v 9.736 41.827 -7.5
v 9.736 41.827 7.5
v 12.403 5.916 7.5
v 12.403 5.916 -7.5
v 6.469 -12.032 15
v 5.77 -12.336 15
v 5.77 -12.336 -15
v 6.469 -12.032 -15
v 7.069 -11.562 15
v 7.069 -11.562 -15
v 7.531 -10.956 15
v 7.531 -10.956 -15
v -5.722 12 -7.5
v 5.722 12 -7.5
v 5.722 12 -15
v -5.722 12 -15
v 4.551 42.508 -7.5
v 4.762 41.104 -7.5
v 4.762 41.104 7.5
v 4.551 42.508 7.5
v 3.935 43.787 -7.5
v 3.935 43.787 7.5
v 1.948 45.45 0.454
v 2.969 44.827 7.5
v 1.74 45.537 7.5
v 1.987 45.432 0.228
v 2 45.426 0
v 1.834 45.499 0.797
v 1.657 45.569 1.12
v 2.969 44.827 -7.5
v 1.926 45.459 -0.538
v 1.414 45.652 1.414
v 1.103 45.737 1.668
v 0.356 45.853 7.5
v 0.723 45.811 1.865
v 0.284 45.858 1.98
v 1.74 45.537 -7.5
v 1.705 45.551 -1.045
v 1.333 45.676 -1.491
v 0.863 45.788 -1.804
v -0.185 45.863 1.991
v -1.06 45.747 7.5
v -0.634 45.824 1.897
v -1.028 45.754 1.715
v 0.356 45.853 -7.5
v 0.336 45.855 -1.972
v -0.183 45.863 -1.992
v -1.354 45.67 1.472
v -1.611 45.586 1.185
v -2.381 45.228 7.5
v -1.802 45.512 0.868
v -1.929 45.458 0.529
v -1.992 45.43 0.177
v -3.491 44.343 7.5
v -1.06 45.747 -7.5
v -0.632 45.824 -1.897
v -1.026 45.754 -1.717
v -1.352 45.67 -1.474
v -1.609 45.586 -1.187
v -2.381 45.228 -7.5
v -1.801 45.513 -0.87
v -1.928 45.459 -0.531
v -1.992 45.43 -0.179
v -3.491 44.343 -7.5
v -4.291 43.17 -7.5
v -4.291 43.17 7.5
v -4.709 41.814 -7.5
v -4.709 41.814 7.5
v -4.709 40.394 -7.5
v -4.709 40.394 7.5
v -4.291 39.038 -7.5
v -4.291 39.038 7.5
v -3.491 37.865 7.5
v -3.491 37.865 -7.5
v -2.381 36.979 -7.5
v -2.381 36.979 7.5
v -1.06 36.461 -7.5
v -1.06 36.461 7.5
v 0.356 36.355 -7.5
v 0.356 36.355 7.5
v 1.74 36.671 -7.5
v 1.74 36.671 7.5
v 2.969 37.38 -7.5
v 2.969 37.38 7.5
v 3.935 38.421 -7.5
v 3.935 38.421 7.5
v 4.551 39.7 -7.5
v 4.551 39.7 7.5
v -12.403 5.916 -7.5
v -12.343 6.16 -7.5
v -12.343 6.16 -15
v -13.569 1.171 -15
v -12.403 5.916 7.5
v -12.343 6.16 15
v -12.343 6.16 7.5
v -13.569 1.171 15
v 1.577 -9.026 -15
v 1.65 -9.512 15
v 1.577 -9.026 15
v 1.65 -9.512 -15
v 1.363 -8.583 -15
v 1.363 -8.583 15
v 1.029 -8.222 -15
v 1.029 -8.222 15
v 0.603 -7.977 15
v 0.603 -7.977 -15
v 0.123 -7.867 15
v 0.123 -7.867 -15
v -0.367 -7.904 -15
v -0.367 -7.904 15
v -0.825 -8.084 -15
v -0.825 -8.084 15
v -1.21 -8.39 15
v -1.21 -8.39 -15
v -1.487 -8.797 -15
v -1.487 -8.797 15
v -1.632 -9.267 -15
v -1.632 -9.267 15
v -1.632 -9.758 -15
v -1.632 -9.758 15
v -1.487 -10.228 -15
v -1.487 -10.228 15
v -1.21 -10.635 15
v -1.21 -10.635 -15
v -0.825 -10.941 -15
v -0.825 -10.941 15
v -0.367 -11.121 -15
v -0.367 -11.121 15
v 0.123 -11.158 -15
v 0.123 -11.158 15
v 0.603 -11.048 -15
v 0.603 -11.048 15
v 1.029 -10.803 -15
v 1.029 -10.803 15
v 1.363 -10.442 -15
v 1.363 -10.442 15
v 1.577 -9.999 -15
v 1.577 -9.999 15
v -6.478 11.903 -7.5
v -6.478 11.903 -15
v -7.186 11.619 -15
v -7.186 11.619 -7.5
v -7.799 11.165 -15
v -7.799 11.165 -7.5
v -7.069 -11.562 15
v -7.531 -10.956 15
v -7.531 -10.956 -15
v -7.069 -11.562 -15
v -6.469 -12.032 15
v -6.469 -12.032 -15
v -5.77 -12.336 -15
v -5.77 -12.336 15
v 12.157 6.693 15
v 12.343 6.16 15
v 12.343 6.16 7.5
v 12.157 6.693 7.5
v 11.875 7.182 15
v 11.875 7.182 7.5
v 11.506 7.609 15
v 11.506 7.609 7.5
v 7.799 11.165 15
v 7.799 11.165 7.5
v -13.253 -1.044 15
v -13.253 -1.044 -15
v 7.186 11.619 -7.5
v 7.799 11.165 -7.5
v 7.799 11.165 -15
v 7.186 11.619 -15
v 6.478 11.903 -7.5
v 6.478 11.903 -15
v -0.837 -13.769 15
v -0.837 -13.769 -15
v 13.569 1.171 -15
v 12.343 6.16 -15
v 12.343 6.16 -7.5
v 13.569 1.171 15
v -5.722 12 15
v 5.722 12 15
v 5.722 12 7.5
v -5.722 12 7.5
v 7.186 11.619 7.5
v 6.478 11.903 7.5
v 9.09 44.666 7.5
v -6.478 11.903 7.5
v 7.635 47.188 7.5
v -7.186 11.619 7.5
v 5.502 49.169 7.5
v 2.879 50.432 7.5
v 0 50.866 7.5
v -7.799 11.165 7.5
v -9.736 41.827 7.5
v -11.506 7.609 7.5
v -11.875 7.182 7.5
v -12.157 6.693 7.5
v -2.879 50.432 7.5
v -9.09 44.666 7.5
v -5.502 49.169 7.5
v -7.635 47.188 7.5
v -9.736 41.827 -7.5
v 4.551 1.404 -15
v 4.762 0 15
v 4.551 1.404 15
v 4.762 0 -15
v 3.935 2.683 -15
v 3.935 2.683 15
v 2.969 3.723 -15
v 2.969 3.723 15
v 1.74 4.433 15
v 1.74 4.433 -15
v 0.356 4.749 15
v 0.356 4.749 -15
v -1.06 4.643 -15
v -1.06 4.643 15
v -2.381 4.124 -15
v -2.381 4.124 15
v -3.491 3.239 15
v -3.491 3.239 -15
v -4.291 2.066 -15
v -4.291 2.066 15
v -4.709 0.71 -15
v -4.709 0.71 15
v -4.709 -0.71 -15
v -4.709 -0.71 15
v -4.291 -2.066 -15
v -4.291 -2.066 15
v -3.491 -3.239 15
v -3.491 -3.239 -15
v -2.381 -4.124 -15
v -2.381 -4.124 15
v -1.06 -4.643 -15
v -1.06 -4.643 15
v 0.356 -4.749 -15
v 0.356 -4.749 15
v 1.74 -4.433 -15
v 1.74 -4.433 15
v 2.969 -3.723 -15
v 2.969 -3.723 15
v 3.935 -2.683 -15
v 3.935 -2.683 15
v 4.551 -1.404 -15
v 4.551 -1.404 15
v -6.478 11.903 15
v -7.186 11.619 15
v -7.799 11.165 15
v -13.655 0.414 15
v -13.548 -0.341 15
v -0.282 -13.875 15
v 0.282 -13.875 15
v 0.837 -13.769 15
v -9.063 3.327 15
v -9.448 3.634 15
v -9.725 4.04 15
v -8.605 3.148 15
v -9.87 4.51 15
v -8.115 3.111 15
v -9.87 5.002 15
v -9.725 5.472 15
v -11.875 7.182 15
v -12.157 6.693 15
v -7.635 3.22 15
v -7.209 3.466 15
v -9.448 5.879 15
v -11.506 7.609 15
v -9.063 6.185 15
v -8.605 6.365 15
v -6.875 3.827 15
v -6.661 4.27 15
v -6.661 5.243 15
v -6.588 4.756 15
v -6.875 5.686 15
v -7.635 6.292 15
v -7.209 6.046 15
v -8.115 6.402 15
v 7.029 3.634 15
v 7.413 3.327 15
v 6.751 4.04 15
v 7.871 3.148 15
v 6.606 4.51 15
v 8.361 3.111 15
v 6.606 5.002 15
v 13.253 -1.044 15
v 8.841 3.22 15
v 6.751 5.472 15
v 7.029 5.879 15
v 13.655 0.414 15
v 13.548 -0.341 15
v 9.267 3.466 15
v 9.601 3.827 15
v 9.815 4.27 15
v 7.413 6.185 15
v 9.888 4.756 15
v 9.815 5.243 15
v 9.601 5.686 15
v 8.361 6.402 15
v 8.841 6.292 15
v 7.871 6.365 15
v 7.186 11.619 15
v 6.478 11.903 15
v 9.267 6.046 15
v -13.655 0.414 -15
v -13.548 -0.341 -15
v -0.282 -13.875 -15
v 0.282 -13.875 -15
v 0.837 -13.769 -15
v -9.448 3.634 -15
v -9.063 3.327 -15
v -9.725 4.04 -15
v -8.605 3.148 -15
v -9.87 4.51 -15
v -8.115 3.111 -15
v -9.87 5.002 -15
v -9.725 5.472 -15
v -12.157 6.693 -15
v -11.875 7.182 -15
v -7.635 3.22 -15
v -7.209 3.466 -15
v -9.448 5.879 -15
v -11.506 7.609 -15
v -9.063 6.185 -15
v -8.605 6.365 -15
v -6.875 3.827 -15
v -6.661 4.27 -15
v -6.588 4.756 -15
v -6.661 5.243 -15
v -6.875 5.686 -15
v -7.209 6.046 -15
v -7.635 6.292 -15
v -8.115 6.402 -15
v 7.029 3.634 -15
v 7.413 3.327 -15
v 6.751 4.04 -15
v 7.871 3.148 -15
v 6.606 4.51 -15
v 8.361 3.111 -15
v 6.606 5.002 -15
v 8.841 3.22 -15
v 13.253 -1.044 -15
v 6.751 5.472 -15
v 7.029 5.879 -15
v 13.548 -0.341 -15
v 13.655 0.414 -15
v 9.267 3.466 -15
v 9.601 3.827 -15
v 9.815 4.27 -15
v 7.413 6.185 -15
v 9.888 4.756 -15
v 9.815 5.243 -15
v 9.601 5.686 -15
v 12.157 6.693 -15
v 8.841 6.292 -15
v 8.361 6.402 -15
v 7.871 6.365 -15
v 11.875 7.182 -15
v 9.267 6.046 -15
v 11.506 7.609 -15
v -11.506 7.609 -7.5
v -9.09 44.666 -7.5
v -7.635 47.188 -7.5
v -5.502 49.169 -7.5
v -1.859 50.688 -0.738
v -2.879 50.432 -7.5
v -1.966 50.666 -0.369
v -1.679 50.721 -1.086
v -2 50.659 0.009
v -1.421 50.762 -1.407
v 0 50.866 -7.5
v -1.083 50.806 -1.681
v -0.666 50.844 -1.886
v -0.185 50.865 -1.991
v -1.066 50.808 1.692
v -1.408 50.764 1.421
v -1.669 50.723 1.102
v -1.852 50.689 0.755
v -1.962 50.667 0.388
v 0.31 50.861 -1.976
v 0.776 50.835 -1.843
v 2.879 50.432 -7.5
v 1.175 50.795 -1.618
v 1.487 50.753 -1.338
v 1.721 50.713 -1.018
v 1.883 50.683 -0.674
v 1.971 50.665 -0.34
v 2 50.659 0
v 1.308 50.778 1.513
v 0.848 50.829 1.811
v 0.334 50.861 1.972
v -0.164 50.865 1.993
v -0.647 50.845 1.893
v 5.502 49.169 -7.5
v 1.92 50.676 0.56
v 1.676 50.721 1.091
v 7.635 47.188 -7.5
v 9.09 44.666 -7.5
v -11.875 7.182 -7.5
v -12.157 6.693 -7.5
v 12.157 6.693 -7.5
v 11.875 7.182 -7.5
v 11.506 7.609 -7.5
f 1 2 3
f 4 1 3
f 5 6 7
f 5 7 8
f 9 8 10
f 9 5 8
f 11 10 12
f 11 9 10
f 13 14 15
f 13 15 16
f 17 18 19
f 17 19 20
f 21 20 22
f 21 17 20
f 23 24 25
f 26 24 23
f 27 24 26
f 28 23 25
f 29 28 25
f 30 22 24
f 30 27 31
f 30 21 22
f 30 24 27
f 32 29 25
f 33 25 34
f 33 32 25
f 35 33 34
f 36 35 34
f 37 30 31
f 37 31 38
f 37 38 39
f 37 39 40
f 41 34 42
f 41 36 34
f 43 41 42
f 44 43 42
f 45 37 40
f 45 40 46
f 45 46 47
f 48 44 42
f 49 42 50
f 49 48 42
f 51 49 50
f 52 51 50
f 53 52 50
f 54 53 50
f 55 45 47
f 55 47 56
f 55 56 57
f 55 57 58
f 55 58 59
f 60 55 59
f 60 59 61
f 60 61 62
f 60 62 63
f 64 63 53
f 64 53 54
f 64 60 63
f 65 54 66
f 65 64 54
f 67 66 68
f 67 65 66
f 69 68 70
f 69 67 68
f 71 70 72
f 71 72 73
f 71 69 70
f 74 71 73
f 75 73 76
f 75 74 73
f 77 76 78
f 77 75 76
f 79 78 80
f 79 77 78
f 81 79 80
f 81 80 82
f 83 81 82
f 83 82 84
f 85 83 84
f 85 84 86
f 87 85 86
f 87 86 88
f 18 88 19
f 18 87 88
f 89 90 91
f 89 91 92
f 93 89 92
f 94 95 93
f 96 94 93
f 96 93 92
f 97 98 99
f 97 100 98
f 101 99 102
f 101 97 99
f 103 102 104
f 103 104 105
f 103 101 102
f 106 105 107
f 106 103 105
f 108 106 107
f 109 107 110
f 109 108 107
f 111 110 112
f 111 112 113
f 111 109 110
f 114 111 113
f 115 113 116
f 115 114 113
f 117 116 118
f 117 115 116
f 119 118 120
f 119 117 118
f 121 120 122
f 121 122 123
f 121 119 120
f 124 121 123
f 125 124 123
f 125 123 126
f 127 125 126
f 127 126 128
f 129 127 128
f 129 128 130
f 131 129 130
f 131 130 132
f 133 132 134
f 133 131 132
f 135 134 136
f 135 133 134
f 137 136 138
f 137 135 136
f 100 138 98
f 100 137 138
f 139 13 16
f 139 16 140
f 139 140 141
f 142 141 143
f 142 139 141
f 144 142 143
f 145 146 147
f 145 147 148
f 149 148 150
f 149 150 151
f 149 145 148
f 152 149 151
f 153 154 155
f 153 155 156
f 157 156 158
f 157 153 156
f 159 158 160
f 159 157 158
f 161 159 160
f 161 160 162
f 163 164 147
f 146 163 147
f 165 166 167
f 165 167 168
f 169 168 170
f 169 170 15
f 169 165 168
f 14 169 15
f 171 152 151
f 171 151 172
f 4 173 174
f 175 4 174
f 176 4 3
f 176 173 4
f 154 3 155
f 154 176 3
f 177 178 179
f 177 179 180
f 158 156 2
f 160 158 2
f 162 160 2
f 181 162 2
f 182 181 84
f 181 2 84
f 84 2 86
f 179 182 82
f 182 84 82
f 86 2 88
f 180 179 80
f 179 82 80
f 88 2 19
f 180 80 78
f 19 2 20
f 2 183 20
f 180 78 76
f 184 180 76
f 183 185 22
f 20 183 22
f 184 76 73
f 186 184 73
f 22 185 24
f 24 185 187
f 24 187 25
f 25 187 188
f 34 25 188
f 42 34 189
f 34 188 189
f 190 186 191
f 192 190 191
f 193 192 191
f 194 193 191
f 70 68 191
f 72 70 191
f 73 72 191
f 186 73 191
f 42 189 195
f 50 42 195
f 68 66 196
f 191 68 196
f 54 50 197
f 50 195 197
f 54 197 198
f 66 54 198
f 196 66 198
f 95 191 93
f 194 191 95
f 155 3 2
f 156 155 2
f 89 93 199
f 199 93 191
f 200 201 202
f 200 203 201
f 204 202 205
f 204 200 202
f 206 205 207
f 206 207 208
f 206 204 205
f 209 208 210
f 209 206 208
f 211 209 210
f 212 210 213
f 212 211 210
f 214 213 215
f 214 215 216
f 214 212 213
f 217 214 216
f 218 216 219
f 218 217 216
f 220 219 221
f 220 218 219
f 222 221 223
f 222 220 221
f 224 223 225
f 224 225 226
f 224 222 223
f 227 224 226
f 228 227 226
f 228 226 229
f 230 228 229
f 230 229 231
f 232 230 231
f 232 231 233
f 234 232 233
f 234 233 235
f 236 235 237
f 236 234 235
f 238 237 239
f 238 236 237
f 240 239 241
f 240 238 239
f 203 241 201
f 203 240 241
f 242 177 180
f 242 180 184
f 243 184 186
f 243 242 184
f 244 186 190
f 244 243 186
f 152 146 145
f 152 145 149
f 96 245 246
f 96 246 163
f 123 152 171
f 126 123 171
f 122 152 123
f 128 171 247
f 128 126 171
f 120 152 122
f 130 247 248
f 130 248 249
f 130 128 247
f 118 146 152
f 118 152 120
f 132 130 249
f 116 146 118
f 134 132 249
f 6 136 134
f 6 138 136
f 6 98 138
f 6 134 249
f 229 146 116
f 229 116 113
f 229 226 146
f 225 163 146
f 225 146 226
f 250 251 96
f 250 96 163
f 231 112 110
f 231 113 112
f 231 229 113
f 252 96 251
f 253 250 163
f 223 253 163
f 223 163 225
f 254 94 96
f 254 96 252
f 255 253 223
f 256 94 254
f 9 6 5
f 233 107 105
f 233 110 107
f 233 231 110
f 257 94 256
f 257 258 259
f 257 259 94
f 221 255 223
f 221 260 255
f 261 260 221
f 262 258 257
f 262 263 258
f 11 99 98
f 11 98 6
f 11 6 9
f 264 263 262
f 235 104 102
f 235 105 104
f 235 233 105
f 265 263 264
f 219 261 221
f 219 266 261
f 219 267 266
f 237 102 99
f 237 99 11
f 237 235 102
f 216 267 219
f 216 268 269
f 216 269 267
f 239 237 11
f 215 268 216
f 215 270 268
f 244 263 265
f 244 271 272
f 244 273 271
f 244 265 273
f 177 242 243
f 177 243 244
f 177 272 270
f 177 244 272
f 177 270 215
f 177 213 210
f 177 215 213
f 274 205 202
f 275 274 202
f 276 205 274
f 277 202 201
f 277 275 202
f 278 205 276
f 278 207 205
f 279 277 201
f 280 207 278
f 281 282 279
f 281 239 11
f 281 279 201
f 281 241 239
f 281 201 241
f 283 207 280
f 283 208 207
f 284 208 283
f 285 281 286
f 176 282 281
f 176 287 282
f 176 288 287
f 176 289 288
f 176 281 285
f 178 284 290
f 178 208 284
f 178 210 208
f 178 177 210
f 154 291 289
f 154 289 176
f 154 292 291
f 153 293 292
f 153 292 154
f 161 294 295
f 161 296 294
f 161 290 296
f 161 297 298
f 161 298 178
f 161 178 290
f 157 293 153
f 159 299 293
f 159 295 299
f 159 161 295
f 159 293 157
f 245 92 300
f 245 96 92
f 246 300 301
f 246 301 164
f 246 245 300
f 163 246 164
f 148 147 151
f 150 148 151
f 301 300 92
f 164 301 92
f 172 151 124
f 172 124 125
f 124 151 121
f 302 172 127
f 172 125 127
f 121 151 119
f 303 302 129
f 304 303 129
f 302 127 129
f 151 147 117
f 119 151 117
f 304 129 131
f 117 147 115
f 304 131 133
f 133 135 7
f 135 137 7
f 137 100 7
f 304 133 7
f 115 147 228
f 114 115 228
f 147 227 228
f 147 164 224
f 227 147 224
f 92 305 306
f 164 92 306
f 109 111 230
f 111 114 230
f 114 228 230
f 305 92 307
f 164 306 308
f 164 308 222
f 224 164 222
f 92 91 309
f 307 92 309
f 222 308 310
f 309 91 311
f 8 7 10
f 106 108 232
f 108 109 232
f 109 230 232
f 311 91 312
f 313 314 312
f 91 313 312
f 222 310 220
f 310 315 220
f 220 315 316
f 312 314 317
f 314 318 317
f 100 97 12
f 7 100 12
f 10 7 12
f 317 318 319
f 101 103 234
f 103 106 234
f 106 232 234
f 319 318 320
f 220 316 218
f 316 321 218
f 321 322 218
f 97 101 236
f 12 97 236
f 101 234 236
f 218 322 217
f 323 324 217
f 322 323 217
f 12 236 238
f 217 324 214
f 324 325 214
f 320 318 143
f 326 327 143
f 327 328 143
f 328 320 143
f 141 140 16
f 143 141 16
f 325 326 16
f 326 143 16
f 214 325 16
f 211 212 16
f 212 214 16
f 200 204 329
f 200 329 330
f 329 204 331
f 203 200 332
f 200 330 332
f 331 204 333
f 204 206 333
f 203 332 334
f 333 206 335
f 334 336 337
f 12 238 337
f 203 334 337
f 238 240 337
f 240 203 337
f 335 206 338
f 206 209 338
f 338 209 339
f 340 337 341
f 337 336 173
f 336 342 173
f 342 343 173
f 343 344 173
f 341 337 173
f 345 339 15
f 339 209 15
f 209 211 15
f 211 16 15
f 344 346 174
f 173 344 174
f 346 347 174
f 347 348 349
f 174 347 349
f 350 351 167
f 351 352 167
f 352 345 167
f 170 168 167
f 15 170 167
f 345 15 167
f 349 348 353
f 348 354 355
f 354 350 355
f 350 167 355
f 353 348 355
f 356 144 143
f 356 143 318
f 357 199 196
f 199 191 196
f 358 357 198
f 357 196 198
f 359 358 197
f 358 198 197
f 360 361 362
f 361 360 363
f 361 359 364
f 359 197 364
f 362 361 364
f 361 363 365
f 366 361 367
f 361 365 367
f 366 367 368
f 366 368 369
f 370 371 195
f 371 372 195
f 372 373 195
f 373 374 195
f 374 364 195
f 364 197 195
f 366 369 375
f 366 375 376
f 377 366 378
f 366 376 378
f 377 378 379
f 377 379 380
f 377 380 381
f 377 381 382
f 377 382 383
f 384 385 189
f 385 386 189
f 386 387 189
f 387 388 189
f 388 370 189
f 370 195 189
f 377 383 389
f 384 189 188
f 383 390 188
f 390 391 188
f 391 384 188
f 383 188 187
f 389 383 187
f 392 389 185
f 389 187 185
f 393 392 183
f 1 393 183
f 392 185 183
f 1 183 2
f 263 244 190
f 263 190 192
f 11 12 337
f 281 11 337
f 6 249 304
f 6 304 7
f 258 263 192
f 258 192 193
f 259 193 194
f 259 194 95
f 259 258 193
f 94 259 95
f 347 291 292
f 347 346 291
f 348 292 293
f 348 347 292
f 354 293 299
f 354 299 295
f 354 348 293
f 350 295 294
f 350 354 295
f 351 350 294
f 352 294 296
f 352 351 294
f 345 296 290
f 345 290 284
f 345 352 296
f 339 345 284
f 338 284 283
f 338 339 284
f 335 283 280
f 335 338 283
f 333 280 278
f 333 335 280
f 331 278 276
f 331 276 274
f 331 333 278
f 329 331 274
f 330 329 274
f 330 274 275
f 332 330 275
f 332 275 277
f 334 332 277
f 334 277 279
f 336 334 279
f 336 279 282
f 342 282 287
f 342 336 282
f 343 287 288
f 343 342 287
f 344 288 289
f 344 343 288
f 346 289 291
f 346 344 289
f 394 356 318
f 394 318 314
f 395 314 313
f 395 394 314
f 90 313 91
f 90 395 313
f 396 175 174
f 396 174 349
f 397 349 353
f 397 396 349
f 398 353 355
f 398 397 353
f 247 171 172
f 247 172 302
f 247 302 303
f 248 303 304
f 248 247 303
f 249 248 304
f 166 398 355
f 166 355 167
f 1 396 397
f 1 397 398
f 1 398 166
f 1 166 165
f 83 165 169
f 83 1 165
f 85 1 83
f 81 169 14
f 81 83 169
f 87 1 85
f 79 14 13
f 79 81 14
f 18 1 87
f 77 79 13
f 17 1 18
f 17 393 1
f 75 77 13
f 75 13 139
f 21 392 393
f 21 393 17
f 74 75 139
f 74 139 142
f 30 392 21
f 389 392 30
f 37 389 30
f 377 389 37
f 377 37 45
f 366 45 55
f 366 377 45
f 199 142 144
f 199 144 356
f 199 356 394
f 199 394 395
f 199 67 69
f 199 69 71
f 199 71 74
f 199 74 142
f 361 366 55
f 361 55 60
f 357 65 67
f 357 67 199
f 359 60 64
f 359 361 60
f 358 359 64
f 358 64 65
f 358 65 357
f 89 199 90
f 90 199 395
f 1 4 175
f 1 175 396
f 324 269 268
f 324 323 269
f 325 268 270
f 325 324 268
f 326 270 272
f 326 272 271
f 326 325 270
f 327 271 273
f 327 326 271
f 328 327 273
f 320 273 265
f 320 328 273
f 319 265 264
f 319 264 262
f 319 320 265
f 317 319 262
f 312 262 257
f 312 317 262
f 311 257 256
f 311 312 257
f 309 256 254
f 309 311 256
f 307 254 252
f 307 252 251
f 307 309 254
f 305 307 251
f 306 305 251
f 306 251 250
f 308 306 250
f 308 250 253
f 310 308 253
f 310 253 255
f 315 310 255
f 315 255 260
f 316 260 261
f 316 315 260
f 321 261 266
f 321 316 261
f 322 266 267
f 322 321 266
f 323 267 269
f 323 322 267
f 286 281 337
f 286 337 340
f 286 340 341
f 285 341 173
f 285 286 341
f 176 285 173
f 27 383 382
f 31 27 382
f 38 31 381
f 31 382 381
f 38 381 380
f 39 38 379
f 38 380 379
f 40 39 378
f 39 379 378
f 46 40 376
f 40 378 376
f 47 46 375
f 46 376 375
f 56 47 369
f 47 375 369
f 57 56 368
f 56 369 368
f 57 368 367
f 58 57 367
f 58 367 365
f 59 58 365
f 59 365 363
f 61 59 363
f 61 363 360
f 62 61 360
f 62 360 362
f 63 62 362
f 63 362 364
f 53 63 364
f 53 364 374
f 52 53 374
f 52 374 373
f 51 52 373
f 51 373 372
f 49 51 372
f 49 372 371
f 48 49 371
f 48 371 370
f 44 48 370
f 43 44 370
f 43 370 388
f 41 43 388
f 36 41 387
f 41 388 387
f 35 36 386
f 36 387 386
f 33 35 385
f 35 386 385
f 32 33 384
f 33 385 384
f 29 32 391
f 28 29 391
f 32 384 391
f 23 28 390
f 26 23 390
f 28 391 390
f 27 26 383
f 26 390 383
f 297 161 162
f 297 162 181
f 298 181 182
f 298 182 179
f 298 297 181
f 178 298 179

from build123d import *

# Parameters (mm, degrees)
SKETCH1_R           = 4.7625
SKETCH1_R_2         = 1.65
BOSS_EXTRUDE1_DEPTH = 15
SKETCH2_R           = 4.7625
BOSS_EXTRUDE2_DEPTH = 7.5
CUT_EXTRUDE1_REACH  = 66.755
SKETCH3_R           = 2


with BuildPart() as part:
    # Sketch1 → Boss-Extrude1 (new body, symmetric)
    with BuildSketch(Plane.XY):
        with BuildLine():
            Line((-13.253372163, -1.044486042), (-7.531237528, -10.955513958))
            ThreePointArc((-7.531237528, -10.955513958), (-6.784217233, -11.816359568), (-5.770008435, -12.336431676))
            Line((-5.770008435, -12.336431676), (-0.836847118, -13.76941319))
            ThreePointArc((-0.836847118, -13.76941319), (0, -13.888495471), (0.836847118, -13.76941319))
            Line((0.836847118, -13.76941319), (5.770008435, -12.336431676))
            ThreePointArc((5.770008435, -12.336431676), (6.784217233, -11.816359568), (7.531237528, -10.955513958))
            Line((7.531237528, -10.955513958), (13.253372163, -1.044486042))
            ThreePointArc((13.253372163, -1.044486042), (13.625376182, 0.032875315), (13.568667441, 1.171241953))
            Line((13.568667441, 1.171241953), (12.343085176, 6.159975731))
            ThreePointArc((12.343085176, 6.159975731), (12.027789898, 6.944247736), (11.506238058, 7.609437458))
            Line((11.506238058, 7.609437458), (7.798659006, 11.165189723))
            ThreePointArc((7.798659006, 11.165189723), (6.841158949, 11.783484253), (5.722134635, 12))
            Line((5.722134635, 12), (-5.722134635, 12))
            ThreePointArc((-5.722134635, 12), (-6.841158949, 11.783484253), (-7.798659006, 11.165189723))
            Line((-7.798659006, 11.165189723), (-11.506238058, 7.609437458))
            ThreePointArc((-11.506238058, 7.609437458), (-12.027789898, 6.944247736), (-12.343085176, 6.159975731))
            Line((-12.343085176, 6.159975731), (-13.568667441, 1.171241953))
            ThreePointArc((-13.568667441, 1.171241953), (-13.625376182, 0.032875315), (-13.253372163, -1.044486042))
        make_face()
        Circle(SKETCH1_R, mode=Mode.SUBTRACT)
        with Locations((-8.238066653, 4.75625)):
            Circle(SKETCH1_R_2, mode=Mode.SUBTRACT)
        with Locations((8.238066653, 4.75625)):
            Circle(SKETCH1_R_2, mode=Mode.SUBTRACT)
        with Locations((0, -9.5125)):
            Circle(SKETCH1_R_2, mode=Mode.SUBTRACT)
    extrude(amount=BOSS_EXTRUDE1_DEPTH, both=True)

    # Sketch2 → Boss-Extrude2 (add, symmetric)
    with BuildSketch(Plane.XY):
        with BuildLine():
            Line((-12.421472807, 5.666457921), (-9.735682804, 41.826981922))
            ThreePointArc((-9.735682804, 41.826981922), (0, 50.866372944), (9.735682804, 41.826981922))
            Line((9.735682804, 41.826981922), (12.421472807, 5.666457921))
            Line((12.421472807, 5.666457921), (0, 12))
            Line((0, 12), (-12.421472807, 5.666457921))
        make_face()
        with Locations((0, 41.103872944)):
            Circle(SKETCH2_R, mode=Mode.SUBTRACT)
    extrude(amount=BOSS_EXTRUDE2_DEPTH, both=True)

    # Sketch3 → Cut-Extrude1 (cut, up to next)
    with BuildSketch(Plane(origin=(0, 50.866372944, 0), x_dir=(1, 0, 0), z_dir=(0, 1, 0)), mode=Mode.PRIVATE) as cut_extrude1_sk1:
        Circle(SKETCH3_R)
    cut_extrude1_tool1 = extrude(cut_extrude1_sk1.sketch, amount=-CUT_EXTRUDE1_REACH, mode=Mode.PRIVATE) & part.part
    add(cut_extrude1_tool1.solids().sort_by_distance((0, 50.866373, 0))[0], mode=Mode.SUBTRACT)


solid = part.part
